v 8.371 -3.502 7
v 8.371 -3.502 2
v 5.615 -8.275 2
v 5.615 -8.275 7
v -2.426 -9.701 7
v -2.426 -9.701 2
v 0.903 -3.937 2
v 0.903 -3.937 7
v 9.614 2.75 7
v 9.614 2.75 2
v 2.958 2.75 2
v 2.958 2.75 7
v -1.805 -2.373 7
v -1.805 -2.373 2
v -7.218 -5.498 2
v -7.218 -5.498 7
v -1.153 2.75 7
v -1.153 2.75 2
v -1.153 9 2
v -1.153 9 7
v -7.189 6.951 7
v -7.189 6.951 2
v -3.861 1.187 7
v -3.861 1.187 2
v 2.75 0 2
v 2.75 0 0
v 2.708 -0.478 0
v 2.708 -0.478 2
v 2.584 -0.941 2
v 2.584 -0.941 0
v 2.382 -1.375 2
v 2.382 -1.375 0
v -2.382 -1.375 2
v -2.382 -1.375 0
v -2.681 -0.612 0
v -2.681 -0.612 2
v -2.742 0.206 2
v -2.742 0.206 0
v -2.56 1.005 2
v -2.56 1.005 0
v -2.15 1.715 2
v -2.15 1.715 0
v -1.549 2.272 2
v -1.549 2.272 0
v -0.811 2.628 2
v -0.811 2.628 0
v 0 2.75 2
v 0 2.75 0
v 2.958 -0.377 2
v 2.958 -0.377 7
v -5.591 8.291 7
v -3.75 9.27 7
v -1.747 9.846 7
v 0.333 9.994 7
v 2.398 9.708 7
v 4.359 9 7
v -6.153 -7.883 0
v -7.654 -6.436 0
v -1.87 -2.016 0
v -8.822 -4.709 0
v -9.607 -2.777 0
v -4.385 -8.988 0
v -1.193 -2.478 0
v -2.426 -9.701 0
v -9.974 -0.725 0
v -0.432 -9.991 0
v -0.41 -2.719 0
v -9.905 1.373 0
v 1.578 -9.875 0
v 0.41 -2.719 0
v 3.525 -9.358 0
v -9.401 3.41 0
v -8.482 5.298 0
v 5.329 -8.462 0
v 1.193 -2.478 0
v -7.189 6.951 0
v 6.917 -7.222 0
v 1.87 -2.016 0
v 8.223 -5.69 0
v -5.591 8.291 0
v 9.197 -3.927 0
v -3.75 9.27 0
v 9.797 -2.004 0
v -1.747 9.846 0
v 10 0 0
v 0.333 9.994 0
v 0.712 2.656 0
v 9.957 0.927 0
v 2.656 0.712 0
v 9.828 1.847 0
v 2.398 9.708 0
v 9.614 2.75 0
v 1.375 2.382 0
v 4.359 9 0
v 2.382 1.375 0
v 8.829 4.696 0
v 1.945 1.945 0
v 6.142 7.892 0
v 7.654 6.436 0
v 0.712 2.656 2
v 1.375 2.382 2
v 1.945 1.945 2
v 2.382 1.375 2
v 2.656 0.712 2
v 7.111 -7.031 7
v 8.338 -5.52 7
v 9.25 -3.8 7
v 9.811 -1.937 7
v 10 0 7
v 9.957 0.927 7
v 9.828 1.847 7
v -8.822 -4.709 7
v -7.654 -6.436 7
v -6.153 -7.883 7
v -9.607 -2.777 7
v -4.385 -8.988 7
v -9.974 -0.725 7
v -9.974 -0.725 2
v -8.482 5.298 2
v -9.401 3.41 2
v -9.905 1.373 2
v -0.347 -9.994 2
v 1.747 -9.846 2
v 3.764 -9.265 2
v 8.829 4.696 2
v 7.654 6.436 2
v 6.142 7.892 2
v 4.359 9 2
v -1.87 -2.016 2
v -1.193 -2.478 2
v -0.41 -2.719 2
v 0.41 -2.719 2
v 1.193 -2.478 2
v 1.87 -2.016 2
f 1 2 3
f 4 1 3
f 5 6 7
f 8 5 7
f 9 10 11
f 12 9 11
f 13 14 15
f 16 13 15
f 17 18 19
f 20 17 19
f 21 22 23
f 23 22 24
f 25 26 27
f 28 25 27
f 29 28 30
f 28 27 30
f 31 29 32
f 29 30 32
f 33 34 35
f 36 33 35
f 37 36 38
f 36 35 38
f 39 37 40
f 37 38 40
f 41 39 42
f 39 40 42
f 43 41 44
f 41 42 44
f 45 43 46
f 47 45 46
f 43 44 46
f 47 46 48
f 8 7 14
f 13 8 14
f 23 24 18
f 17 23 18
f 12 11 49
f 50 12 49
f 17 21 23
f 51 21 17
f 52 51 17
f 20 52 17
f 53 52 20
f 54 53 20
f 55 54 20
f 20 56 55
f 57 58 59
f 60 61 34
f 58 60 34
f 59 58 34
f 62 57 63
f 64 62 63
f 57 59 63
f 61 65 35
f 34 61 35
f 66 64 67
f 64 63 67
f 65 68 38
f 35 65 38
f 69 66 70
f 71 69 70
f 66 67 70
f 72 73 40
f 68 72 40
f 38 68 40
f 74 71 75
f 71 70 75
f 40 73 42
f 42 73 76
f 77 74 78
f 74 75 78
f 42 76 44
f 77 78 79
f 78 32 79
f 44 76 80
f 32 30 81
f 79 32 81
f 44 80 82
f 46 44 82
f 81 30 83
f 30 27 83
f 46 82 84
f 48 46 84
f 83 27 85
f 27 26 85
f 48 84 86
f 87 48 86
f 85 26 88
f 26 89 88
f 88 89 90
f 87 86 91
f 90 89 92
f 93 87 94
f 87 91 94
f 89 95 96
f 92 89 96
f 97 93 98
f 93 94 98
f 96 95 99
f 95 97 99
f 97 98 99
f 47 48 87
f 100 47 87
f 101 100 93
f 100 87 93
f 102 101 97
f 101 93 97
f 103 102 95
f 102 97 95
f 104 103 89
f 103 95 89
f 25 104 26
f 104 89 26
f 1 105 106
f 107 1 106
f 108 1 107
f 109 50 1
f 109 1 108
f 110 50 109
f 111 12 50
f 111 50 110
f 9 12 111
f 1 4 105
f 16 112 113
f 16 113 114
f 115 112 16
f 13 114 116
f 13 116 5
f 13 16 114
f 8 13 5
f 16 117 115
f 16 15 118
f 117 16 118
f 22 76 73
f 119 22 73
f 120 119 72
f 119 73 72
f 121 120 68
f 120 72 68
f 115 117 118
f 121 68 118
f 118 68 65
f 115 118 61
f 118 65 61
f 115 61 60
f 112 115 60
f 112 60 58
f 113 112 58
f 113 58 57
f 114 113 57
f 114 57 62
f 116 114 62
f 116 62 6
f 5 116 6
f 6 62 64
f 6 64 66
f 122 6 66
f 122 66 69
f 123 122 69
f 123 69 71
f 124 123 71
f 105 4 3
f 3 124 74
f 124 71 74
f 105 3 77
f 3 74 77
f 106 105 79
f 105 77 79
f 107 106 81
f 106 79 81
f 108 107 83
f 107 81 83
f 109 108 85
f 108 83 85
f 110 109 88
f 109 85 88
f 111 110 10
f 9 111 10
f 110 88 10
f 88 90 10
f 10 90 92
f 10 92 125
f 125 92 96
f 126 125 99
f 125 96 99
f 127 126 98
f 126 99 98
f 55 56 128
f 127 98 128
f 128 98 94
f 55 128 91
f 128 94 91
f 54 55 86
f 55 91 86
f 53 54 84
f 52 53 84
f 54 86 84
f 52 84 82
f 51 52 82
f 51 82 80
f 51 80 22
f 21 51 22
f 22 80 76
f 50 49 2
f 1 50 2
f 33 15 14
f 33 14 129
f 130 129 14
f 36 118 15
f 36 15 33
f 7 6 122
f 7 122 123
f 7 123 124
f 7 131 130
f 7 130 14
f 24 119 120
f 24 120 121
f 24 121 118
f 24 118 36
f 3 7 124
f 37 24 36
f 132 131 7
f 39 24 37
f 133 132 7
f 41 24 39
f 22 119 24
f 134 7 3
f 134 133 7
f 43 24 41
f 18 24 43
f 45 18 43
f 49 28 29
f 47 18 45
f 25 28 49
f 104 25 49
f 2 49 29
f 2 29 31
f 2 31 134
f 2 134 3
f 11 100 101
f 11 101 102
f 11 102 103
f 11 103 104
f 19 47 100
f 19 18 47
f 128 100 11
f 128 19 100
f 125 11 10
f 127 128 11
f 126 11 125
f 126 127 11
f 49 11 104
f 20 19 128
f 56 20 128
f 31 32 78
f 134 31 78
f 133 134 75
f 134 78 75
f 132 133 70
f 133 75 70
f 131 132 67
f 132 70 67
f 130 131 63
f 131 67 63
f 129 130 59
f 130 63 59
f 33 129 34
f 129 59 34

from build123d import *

# Parameters (mm, degrees)
F1_DEPTH = 2
F2_DEPTH = 7


# Not quite as in the source:
# - a feature names something its author has since deleted; it is built from what else it names


with BuildPart() as f1:
    # F0 (on Top) → F1 (new body)
    with BuildSketch(Plane.XY):
        with BuildLine():
            Line((2.9579698818, 2.75), (9.6144422615, 2.75))
            ThreePointArc((9.6144422615, 2.75), (7.6537044043, 6.4359000064), (4.3588989435, 9))
            Line((4.3588989435, 9), (-1.1528000428, 9))
            Line((-1.1528000428, 9), (-1.1528000428, 2.75))
            Line((-1.1528000428, 2.75), (0, 2.75))
            Line((0, 2.75), (2.9579698818, 2.75))
        make_face()
        with BuildLine():
            ThreePointArc((-2.4256512704, -9.7013512417), (1.7468006996, -9.8462524503), (5.6147791623, -8.2749172176))
            Line((5.6147791623, -8.2749172176), (8.3706286555, -3.5016458774))
            Line((8.3706286555, -3.5016458774), (2.9579698818, -0.3766458774))
            Line((2.9579698818, -0.3766458774), (2.3815698685, -1.3749999859))
            Line((2.3815698685, -1.3749999859), (0.9025849195, -3.9366770613))
            Line((0.9025849195, -3.9366770613), (-2.4256512704, -9.7013512417))
        make_face()
        with BuildLine():
            Line((2.9579698818, -0.3766458774), (2.9579698818, 2.75))
            Line((2.9579698818, 2.75), (0, 2.75))
            ThreePointArc((0, 2.75), (1.9445436483, 1.9445436483), (2.75, 0))
            ThreePointArc((2.75, 0), (2.6562960244, -0.7117523662), (2.3815698685, -1.3749999859))
            Line((2.3815698685, -1.3749999859), (2.9579698818, -0.3766458774))
        make_face()
        with BuildLine():
            Line((-3.8605548013, 1.1866770613), (-7.1887909912, 6.9513512417))
            ThreePointArc((-7.1887909912, 6.9513512417), (-9.4005051039, 3.410352444), (-9.9736781058, -0.7250827824))
            Line((-9.9736781058, -0.7250827824), (-7.2178286127, -5.4983541226))
            Line((-7.2178286127, -5.4983541226), (-1.805169839, -2.3733541226))
            Line((-1.805169839, -2.3733541226), (-2.3815698389, -1.3750000373))
            Line((-2.3815698389, -1.3750000373), (-3.8605548013, 1.1866770613))
        make_face()
        with BuildLine():
            ThreePointArc((-2.3815698389, -1.3750000373), (-2.3815698712, 1.3749999814), (0, 2.75))
            Line((0, 2.75), (-1.1528000428, 2.75))
            Line((-1.1528000428, 2.75), (-3.8605548013, 1.1866770613))
            Line((-3.8605548013, 1.1866770613), (-2.3815698389, -1.3750000373))
        make_face()
        with BuildLine():
            Line((-1.805169839, -2.3733541226), (0.9025849195, -3.9366770613))
            Line((0.9025849195, -3.9366770613), (2.3815698685, -1.3749999859))
            ThreePointArc((2.3815698685, -1.3749999859), (2.97e-08, -2.75), (-2.3815698389, -1.3750000373))
            Line((-2.3815698389, -1.3750000373), (-1.805169839, -2.3733541226))
        make_face()
    extrude(amount=F1_DEPTH)

    # F0 (on Top) → F2 (join)
    with BuildSketch(Plane.XY):
        with BuildLine():
            Line((-1.1528000428, 9), (4.3588989435, 9))
            ThreePointArc((4.3588989435, 9), (-1.7468006996, 9.8462524503), (-7.1887909912, 6.9513512417))
            Line((-7.1887909912, 6.9513512417), (-3.8605548013, 1.1866770613))
            Line((-3.8605548013, 1.1866770613), (-1.1528000428, 2.75))
            Line((-1.1528000428, 2.75), (-1.1528000428, 9))
        make_face()
        with BuildLine():
            ThreePointArc((5.6147791623, -8.2749172176), (8.8359434025, -4.6825318139), (10, 0))
            ThreePointArc((10, 0), (9.9031414868, 1.3884483038), (9.6144422615, 2.75))
            Line((9.6144422615, 2.75), (2.9579698818, 2.75))
            Line((2.9579698818, 2.75), (2.9579698818, -0.3766458774))
            Line((2.9579698818, -0.3766458774), (8.3706286555, -3.5016458774))
            Line((8.3706286555, -3.5016458774), (5.6147791623, -8.2749172176))
        make_face()
        with BuildLine():
            ThreePointArc((-9.9736781058, -0.7250827824), (-7.6537044043, -6.4359000064), (-2.4256512704, -9.7013512417))
            Line((-2.4256512704, -9.7013512417), (0.9025849195, -3.9366770613))
            Line((0.9025849195, -3.9366770613), (-1.805169839, -2.3733541226))
            Line((-1.805169839, -2.3733541226), (-7.2178286127, -5.4983541226))
            Line((-7.2178286127, -5.4983541226), (-9.9736781058, -0.7250827824))
        make_face()
    extrude(amount=F2_DEPTH)


solid = f1.part
